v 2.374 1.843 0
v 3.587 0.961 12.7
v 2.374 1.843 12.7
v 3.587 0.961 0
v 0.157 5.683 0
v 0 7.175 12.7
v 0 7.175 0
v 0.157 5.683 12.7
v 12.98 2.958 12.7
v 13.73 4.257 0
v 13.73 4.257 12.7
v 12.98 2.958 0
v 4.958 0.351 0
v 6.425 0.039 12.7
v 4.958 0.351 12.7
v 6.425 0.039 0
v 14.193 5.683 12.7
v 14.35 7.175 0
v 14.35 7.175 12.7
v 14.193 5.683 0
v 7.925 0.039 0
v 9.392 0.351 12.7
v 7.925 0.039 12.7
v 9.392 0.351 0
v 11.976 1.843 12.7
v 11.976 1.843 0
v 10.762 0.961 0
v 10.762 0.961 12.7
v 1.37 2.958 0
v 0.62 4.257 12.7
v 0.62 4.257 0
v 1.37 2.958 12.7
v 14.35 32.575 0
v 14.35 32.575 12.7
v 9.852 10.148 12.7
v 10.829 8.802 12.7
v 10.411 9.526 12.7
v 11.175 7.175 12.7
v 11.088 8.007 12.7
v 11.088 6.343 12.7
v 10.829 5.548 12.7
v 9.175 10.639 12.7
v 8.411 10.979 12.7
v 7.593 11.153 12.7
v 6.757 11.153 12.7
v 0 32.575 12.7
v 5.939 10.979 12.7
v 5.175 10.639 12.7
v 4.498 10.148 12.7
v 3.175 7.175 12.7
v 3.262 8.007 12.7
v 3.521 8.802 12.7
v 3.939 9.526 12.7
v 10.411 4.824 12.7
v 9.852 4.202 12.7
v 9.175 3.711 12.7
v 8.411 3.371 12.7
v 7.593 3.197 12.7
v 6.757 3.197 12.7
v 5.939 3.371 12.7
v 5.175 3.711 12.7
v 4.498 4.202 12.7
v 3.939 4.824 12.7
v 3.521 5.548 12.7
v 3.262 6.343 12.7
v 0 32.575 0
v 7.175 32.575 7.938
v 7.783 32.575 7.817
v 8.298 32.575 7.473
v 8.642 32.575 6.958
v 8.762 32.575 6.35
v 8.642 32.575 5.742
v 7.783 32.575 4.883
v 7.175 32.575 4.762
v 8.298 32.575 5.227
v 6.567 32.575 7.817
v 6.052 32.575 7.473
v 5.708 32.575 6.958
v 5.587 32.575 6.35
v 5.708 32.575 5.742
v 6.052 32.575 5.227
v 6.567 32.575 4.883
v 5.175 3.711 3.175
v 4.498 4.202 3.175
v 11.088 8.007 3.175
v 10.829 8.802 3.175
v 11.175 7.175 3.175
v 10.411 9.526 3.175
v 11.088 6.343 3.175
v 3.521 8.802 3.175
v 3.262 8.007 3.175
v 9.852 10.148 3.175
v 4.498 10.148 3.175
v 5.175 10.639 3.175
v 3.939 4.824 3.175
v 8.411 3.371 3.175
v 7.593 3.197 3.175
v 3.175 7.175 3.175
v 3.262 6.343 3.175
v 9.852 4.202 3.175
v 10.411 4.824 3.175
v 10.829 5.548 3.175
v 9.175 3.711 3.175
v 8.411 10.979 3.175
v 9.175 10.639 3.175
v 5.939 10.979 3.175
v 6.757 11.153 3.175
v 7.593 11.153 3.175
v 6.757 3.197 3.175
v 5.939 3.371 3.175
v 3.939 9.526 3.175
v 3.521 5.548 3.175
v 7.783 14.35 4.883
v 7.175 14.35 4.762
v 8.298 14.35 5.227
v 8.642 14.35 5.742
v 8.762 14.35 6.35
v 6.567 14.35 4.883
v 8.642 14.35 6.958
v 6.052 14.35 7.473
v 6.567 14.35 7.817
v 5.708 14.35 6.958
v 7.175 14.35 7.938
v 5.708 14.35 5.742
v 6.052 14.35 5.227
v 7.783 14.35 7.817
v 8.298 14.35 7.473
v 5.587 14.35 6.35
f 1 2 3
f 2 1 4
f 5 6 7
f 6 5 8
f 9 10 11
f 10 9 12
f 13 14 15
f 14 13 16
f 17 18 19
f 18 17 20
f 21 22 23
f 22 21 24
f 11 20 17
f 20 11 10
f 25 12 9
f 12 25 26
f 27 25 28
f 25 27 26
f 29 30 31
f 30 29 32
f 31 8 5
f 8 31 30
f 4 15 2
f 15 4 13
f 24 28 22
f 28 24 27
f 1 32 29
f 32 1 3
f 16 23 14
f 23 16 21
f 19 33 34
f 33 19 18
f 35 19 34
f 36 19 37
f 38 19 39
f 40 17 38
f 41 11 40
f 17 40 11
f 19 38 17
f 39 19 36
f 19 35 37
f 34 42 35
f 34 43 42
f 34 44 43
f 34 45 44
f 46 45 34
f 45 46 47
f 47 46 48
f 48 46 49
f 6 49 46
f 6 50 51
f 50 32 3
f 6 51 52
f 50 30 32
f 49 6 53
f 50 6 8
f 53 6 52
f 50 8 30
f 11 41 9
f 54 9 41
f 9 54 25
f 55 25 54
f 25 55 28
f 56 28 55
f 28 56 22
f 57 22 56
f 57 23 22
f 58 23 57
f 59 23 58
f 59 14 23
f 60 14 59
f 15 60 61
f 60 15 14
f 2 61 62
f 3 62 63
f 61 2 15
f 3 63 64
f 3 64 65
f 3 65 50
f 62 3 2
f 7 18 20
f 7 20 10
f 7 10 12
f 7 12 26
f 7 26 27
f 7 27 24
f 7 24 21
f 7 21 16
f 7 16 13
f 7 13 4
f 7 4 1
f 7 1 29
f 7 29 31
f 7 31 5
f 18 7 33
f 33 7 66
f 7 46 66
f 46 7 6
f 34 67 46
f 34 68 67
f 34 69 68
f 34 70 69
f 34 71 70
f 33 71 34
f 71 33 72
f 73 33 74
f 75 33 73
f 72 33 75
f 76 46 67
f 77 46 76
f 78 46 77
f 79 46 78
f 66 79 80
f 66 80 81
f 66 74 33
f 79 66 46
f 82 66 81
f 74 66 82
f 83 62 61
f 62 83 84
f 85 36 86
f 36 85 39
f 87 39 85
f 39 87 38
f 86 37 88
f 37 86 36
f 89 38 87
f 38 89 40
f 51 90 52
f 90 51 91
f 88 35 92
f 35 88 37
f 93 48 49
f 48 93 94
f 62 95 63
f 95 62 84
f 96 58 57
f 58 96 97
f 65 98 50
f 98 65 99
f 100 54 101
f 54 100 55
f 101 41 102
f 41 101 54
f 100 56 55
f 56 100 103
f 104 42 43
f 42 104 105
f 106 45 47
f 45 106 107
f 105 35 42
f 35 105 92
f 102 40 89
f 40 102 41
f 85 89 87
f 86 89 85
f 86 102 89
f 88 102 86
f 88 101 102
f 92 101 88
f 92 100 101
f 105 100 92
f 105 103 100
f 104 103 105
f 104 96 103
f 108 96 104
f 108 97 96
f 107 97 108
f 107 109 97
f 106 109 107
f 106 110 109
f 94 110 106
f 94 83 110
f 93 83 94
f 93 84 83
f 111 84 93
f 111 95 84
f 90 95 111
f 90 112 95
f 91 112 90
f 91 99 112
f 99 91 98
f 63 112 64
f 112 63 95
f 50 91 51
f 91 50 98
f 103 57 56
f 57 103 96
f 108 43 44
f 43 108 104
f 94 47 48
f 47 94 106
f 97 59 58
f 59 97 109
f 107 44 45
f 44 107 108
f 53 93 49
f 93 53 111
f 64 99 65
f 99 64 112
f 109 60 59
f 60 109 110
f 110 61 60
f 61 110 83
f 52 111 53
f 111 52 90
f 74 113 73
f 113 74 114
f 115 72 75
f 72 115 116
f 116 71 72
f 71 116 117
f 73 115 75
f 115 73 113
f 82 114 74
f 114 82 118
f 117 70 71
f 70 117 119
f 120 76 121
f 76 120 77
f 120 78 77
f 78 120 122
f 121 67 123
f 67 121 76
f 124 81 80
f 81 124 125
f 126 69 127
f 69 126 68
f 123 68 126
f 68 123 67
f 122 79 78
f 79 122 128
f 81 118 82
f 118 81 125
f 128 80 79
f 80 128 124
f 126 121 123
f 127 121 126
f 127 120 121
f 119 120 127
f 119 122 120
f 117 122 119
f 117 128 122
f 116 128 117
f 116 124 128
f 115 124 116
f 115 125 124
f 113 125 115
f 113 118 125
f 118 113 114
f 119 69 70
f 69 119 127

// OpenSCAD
inch = 25.4;

rod_dia = 8;
screw_dia = 1/8*inch;

rod_margin = 1/8*inch;
rod_depth = 3/8*inch;

bed_height = 1*inch;

///////////////

piece_width = rod_dia+2*rod_margin; //x
piece_depth = bed_height+rod_dia/2+rod_margin; //y
piece_height = rod_depth+rod_margin; //z

difference()
{
	cube(size=[piece_width,piece_depth,piece_height]);
	translate(v=[piece_width/2,rod_dia/2+rod_margin,rod_margin])
		cylinder(r=rod_dia/2, h=piece_height, $fn=30);
	difference()
	{
		translate(v=[-0.1,-0.1,-0.1])
			cube(size=[piece_width+0.2,
					rod_margin+rod_dia/2+0.1,
					piece_height+0.2]);
		translate(v=[piece_width/2,piece_width/2,-0.2])
			cylinder(r=piece_width/2, h=2*piece_height, $fn=30);
	}
	translate(v=[piece_width/2,rod_margin*2+rod_dia,piece_height/2])
		rotate(a=[-90,0,0])
			cylinder(r=screw_dia/2, h=piece_depth, $fn=16);
}
